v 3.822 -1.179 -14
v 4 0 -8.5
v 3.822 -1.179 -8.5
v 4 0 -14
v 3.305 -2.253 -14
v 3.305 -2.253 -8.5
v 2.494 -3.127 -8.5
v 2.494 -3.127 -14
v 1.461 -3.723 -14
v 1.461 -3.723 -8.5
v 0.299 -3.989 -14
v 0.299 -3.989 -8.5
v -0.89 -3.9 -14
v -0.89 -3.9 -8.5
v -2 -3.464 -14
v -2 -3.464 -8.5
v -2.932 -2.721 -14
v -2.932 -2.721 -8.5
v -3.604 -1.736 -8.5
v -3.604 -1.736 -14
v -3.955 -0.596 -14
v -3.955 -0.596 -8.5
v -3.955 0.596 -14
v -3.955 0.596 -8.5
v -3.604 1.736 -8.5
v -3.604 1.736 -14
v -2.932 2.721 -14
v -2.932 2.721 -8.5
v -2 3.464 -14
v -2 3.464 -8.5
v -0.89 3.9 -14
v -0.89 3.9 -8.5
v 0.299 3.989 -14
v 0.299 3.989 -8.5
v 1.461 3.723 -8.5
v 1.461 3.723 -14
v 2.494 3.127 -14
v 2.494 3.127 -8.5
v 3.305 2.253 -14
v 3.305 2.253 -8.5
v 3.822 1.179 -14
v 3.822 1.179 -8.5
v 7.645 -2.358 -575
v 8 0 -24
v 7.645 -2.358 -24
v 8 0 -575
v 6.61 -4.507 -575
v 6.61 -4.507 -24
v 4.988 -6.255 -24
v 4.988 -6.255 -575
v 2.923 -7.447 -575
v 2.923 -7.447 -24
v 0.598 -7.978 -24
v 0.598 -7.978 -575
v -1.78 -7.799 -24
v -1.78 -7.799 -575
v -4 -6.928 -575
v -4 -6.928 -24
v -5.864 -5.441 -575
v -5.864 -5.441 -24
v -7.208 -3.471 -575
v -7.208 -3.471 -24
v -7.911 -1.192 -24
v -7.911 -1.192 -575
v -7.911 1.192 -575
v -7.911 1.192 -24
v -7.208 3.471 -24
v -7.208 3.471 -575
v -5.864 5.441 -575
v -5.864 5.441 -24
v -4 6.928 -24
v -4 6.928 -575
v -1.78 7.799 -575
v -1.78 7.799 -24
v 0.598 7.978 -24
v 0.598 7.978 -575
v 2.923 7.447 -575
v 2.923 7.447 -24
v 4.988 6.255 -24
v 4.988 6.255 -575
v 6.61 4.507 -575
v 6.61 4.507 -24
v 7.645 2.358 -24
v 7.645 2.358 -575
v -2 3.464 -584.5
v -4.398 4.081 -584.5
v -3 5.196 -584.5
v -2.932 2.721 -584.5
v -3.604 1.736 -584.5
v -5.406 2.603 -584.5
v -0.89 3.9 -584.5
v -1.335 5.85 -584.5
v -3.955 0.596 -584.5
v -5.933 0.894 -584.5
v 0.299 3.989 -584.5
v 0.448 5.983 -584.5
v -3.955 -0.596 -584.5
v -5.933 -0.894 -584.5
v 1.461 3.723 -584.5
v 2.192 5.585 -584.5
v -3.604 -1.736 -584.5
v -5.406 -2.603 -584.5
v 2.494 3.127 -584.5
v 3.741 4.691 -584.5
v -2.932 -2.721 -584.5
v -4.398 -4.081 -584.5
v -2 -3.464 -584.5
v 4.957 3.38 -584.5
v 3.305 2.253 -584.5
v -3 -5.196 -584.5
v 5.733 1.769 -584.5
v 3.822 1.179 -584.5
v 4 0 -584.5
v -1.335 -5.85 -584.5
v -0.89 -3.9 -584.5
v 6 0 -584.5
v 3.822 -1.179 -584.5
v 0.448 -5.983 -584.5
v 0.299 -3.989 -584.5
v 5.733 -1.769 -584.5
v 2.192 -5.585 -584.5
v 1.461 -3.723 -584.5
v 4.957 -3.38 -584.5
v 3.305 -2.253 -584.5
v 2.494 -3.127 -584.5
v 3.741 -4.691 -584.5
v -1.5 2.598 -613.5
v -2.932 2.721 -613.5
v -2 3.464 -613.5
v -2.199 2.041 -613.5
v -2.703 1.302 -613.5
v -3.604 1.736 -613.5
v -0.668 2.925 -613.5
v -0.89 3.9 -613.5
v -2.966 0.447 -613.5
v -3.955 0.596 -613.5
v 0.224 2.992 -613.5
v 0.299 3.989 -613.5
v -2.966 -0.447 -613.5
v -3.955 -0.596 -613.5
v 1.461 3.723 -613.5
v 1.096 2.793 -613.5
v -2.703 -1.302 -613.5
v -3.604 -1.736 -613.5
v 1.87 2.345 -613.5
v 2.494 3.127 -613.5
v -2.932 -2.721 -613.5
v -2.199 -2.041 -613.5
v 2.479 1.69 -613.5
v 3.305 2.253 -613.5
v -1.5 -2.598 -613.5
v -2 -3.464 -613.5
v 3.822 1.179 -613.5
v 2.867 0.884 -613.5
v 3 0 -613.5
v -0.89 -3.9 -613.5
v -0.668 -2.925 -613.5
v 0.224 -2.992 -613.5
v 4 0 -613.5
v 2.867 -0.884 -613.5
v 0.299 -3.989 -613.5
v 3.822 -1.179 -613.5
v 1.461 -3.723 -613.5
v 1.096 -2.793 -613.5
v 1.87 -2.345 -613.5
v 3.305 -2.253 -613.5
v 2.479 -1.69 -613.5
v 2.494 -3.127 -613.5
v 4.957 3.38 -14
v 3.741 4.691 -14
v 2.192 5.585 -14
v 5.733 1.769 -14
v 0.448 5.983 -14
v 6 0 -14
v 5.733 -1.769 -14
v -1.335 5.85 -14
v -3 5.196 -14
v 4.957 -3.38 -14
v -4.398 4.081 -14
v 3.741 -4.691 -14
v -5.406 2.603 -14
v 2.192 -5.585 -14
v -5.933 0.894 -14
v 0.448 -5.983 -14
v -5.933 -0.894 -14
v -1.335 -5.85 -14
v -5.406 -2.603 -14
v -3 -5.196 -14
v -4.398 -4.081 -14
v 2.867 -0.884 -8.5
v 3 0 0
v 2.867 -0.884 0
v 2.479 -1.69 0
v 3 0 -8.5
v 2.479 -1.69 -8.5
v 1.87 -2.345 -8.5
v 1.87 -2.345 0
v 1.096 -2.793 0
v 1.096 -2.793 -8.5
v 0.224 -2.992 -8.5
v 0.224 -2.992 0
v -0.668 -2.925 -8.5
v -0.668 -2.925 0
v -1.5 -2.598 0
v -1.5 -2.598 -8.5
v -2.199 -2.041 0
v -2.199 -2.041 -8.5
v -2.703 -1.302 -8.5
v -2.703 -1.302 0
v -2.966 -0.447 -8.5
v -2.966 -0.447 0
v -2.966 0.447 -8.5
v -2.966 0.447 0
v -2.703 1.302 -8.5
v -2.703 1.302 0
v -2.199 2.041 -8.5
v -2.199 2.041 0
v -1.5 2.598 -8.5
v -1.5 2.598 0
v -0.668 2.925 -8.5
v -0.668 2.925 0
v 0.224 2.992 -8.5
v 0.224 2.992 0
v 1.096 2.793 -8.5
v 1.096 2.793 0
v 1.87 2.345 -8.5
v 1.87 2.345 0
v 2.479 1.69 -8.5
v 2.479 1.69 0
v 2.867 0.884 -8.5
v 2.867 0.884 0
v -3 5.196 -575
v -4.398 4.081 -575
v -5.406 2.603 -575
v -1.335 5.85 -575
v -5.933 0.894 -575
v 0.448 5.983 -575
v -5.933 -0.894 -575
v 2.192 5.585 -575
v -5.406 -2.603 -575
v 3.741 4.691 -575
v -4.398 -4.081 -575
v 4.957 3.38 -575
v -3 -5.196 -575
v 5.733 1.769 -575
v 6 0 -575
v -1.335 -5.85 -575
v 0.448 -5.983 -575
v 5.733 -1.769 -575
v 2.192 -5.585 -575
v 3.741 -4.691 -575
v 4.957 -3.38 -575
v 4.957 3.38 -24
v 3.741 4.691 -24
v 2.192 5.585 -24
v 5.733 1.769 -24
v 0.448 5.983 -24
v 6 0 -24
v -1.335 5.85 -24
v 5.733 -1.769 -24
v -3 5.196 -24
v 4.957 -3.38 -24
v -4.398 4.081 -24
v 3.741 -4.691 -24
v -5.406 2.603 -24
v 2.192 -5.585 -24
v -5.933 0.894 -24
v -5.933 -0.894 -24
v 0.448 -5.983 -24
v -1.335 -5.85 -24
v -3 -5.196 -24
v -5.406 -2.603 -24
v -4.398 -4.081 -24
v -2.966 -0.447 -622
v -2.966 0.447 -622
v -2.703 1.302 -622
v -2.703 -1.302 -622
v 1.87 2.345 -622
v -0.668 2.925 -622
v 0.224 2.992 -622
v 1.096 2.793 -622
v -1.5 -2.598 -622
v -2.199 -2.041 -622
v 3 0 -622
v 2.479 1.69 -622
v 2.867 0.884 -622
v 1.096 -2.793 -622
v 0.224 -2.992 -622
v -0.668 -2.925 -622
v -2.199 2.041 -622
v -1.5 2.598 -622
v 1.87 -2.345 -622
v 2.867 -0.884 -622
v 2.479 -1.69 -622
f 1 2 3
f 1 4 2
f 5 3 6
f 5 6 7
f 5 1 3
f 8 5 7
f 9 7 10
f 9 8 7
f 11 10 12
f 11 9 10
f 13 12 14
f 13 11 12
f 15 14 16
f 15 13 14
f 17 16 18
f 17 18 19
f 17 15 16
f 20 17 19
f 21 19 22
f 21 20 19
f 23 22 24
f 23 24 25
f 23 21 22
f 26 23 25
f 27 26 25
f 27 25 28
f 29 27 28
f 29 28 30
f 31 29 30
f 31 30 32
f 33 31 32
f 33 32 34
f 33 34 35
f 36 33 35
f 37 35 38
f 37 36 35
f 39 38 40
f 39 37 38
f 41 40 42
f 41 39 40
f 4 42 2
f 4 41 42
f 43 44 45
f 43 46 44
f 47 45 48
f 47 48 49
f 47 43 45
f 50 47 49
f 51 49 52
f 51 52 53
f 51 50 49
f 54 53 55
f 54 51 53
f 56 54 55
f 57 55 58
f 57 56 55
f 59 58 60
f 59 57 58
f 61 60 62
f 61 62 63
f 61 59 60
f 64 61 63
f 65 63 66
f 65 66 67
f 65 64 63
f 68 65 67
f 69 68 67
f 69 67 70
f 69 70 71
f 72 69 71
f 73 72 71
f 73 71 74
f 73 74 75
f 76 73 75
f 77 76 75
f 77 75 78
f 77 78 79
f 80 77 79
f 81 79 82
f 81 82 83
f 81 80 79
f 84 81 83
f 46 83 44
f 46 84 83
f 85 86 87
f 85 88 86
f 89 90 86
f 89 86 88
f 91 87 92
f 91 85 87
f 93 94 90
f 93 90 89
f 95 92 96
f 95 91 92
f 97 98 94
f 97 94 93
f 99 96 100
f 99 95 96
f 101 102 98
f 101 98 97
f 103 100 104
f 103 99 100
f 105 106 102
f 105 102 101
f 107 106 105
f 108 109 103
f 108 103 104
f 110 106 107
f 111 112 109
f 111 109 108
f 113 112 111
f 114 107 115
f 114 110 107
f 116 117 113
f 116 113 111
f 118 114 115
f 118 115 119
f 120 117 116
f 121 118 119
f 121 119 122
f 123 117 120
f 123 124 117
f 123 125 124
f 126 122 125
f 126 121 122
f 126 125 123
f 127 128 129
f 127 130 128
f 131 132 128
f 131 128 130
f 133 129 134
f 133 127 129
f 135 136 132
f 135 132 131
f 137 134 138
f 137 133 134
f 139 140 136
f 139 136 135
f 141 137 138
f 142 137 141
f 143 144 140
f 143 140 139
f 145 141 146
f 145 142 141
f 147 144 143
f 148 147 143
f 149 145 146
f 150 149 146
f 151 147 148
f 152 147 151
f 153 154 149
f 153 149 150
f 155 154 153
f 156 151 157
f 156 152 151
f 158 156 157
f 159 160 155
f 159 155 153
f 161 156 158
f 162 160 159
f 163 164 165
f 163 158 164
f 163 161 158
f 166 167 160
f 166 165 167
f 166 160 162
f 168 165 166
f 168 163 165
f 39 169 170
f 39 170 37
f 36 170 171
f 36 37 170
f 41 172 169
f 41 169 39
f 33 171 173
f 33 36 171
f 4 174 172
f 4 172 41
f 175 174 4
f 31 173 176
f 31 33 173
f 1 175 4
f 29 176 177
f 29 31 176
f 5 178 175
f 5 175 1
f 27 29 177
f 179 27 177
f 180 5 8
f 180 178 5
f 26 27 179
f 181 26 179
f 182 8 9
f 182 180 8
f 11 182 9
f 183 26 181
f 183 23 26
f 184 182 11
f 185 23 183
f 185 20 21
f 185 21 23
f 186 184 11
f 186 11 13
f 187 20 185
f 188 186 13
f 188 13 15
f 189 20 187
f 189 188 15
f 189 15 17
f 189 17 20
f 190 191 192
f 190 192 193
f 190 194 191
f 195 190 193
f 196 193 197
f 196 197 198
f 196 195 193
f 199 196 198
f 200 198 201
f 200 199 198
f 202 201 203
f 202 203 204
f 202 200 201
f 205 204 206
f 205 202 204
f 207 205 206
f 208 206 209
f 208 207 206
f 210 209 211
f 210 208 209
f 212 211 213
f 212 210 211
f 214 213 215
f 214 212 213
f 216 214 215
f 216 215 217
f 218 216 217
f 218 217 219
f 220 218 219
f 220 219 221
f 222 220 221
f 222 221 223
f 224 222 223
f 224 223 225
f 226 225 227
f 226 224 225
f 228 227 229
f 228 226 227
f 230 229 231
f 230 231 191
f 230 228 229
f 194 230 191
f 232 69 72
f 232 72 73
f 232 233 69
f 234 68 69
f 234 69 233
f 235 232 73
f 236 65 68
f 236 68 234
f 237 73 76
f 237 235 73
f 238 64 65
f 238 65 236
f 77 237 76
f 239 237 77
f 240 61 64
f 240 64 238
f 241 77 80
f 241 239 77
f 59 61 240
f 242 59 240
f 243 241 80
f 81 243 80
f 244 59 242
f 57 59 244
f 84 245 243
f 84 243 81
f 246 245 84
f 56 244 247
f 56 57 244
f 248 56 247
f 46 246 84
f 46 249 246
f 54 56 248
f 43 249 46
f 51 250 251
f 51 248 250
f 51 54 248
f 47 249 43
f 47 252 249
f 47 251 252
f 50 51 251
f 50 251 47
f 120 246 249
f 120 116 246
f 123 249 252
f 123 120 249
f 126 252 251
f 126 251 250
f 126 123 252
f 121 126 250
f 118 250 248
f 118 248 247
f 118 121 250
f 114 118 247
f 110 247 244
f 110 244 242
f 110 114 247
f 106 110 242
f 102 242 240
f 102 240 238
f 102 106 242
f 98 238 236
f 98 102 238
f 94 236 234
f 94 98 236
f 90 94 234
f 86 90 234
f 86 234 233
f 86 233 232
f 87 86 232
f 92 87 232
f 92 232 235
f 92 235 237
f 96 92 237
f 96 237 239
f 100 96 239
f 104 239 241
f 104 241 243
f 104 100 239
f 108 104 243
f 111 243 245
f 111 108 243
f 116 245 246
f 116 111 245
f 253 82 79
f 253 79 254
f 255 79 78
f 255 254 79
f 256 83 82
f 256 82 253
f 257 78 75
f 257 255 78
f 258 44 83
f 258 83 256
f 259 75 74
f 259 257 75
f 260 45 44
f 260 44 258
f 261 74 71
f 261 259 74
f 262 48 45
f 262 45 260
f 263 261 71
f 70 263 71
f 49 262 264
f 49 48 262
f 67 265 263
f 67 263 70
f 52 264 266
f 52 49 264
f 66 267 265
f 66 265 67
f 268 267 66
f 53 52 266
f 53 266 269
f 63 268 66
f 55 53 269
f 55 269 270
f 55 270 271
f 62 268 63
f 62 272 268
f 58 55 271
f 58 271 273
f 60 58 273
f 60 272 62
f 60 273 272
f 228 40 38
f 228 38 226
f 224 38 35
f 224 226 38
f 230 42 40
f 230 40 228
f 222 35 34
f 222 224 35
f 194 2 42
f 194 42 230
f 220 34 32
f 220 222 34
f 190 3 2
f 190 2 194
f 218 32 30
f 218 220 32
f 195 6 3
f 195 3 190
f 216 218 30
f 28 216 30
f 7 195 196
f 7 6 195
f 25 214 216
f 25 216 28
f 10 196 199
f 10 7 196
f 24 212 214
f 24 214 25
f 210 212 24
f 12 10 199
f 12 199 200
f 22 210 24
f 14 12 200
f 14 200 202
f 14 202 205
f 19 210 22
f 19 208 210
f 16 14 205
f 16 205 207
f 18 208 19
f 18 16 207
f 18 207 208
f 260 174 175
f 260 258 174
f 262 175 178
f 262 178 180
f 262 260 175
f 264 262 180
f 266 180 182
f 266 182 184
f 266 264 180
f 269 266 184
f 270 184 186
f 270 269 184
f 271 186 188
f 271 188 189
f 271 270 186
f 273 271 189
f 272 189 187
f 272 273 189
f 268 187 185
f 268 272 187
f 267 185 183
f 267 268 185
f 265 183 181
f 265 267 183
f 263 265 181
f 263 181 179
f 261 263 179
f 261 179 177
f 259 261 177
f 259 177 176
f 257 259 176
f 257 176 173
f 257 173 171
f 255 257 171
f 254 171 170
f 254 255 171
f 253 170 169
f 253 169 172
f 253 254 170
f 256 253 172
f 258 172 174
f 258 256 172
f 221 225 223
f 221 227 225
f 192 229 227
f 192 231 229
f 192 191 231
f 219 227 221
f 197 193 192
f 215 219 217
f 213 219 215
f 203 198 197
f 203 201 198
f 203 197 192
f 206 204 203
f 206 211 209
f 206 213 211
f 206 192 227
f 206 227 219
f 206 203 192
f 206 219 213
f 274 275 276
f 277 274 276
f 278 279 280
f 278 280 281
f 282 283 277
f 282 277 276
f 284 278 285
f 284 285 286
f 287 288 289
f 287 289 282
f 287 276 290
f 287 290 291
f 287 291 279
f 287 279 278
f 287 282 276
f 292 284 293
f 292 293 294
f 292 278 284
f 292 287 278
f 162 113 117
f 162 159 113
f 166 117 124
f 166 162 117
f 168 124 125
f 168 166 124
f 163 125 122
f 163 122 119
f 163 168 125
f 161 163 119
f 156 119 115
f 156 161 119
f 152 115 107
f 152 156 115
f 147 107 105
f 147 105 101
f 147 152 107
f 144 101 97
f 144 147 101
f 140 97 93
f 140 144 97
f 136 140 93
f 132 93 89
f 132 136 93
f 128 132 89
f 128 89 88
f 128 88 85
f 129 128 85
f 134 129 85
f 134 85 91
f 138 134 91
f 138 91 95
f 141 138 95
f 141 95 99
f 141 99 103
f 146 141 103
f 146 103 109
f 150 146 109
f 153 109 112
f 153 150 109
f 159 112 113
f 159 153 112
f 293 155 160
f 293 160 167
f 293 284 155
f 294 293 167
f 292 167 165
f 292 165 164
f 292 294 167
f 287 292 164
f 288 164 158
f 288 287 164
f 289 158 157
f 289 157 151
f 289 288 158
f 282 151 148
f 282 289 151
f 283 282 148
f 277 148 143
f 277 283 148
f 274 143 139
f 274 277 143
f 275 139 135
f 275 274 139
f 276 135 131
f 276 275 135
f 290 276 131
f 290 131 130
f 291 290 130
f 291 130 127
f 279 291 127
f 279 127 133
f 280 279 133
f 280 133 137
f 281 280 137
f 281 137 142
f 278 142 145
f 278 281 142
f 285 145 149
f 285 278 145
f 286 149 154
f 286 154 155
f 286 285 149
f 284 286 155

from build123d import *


with BuildPart() as part:
    # Schizzo2 → Rivoluzione2 (revolve)
    with BuildSketch(Plane(origin=(0, 0, 0), x_dir=(0, 0, -1), z_dir=(1, 0, 0)), mode=Mode.PRIVATE) as rivoluzione2_sk:
        Polygon((0, 0), (0, 3), (8.5, 3), (8.5, 4), (14, 4), (14, 6), (24, 6), (24, 8), (575, 8), (575, 6), (584.5, 6), (584.5, 4), (613.5, 4), (613.5, 3), (622, 3), (622, 0), align=None)
    revolve(rivoluzione2_sk.sketch.rotate(Axis((0, 0, 0), (0, 0, -1)), 90), axis=Axis((0, 0, 0), (0, 0, -1)))


solid = part.part
